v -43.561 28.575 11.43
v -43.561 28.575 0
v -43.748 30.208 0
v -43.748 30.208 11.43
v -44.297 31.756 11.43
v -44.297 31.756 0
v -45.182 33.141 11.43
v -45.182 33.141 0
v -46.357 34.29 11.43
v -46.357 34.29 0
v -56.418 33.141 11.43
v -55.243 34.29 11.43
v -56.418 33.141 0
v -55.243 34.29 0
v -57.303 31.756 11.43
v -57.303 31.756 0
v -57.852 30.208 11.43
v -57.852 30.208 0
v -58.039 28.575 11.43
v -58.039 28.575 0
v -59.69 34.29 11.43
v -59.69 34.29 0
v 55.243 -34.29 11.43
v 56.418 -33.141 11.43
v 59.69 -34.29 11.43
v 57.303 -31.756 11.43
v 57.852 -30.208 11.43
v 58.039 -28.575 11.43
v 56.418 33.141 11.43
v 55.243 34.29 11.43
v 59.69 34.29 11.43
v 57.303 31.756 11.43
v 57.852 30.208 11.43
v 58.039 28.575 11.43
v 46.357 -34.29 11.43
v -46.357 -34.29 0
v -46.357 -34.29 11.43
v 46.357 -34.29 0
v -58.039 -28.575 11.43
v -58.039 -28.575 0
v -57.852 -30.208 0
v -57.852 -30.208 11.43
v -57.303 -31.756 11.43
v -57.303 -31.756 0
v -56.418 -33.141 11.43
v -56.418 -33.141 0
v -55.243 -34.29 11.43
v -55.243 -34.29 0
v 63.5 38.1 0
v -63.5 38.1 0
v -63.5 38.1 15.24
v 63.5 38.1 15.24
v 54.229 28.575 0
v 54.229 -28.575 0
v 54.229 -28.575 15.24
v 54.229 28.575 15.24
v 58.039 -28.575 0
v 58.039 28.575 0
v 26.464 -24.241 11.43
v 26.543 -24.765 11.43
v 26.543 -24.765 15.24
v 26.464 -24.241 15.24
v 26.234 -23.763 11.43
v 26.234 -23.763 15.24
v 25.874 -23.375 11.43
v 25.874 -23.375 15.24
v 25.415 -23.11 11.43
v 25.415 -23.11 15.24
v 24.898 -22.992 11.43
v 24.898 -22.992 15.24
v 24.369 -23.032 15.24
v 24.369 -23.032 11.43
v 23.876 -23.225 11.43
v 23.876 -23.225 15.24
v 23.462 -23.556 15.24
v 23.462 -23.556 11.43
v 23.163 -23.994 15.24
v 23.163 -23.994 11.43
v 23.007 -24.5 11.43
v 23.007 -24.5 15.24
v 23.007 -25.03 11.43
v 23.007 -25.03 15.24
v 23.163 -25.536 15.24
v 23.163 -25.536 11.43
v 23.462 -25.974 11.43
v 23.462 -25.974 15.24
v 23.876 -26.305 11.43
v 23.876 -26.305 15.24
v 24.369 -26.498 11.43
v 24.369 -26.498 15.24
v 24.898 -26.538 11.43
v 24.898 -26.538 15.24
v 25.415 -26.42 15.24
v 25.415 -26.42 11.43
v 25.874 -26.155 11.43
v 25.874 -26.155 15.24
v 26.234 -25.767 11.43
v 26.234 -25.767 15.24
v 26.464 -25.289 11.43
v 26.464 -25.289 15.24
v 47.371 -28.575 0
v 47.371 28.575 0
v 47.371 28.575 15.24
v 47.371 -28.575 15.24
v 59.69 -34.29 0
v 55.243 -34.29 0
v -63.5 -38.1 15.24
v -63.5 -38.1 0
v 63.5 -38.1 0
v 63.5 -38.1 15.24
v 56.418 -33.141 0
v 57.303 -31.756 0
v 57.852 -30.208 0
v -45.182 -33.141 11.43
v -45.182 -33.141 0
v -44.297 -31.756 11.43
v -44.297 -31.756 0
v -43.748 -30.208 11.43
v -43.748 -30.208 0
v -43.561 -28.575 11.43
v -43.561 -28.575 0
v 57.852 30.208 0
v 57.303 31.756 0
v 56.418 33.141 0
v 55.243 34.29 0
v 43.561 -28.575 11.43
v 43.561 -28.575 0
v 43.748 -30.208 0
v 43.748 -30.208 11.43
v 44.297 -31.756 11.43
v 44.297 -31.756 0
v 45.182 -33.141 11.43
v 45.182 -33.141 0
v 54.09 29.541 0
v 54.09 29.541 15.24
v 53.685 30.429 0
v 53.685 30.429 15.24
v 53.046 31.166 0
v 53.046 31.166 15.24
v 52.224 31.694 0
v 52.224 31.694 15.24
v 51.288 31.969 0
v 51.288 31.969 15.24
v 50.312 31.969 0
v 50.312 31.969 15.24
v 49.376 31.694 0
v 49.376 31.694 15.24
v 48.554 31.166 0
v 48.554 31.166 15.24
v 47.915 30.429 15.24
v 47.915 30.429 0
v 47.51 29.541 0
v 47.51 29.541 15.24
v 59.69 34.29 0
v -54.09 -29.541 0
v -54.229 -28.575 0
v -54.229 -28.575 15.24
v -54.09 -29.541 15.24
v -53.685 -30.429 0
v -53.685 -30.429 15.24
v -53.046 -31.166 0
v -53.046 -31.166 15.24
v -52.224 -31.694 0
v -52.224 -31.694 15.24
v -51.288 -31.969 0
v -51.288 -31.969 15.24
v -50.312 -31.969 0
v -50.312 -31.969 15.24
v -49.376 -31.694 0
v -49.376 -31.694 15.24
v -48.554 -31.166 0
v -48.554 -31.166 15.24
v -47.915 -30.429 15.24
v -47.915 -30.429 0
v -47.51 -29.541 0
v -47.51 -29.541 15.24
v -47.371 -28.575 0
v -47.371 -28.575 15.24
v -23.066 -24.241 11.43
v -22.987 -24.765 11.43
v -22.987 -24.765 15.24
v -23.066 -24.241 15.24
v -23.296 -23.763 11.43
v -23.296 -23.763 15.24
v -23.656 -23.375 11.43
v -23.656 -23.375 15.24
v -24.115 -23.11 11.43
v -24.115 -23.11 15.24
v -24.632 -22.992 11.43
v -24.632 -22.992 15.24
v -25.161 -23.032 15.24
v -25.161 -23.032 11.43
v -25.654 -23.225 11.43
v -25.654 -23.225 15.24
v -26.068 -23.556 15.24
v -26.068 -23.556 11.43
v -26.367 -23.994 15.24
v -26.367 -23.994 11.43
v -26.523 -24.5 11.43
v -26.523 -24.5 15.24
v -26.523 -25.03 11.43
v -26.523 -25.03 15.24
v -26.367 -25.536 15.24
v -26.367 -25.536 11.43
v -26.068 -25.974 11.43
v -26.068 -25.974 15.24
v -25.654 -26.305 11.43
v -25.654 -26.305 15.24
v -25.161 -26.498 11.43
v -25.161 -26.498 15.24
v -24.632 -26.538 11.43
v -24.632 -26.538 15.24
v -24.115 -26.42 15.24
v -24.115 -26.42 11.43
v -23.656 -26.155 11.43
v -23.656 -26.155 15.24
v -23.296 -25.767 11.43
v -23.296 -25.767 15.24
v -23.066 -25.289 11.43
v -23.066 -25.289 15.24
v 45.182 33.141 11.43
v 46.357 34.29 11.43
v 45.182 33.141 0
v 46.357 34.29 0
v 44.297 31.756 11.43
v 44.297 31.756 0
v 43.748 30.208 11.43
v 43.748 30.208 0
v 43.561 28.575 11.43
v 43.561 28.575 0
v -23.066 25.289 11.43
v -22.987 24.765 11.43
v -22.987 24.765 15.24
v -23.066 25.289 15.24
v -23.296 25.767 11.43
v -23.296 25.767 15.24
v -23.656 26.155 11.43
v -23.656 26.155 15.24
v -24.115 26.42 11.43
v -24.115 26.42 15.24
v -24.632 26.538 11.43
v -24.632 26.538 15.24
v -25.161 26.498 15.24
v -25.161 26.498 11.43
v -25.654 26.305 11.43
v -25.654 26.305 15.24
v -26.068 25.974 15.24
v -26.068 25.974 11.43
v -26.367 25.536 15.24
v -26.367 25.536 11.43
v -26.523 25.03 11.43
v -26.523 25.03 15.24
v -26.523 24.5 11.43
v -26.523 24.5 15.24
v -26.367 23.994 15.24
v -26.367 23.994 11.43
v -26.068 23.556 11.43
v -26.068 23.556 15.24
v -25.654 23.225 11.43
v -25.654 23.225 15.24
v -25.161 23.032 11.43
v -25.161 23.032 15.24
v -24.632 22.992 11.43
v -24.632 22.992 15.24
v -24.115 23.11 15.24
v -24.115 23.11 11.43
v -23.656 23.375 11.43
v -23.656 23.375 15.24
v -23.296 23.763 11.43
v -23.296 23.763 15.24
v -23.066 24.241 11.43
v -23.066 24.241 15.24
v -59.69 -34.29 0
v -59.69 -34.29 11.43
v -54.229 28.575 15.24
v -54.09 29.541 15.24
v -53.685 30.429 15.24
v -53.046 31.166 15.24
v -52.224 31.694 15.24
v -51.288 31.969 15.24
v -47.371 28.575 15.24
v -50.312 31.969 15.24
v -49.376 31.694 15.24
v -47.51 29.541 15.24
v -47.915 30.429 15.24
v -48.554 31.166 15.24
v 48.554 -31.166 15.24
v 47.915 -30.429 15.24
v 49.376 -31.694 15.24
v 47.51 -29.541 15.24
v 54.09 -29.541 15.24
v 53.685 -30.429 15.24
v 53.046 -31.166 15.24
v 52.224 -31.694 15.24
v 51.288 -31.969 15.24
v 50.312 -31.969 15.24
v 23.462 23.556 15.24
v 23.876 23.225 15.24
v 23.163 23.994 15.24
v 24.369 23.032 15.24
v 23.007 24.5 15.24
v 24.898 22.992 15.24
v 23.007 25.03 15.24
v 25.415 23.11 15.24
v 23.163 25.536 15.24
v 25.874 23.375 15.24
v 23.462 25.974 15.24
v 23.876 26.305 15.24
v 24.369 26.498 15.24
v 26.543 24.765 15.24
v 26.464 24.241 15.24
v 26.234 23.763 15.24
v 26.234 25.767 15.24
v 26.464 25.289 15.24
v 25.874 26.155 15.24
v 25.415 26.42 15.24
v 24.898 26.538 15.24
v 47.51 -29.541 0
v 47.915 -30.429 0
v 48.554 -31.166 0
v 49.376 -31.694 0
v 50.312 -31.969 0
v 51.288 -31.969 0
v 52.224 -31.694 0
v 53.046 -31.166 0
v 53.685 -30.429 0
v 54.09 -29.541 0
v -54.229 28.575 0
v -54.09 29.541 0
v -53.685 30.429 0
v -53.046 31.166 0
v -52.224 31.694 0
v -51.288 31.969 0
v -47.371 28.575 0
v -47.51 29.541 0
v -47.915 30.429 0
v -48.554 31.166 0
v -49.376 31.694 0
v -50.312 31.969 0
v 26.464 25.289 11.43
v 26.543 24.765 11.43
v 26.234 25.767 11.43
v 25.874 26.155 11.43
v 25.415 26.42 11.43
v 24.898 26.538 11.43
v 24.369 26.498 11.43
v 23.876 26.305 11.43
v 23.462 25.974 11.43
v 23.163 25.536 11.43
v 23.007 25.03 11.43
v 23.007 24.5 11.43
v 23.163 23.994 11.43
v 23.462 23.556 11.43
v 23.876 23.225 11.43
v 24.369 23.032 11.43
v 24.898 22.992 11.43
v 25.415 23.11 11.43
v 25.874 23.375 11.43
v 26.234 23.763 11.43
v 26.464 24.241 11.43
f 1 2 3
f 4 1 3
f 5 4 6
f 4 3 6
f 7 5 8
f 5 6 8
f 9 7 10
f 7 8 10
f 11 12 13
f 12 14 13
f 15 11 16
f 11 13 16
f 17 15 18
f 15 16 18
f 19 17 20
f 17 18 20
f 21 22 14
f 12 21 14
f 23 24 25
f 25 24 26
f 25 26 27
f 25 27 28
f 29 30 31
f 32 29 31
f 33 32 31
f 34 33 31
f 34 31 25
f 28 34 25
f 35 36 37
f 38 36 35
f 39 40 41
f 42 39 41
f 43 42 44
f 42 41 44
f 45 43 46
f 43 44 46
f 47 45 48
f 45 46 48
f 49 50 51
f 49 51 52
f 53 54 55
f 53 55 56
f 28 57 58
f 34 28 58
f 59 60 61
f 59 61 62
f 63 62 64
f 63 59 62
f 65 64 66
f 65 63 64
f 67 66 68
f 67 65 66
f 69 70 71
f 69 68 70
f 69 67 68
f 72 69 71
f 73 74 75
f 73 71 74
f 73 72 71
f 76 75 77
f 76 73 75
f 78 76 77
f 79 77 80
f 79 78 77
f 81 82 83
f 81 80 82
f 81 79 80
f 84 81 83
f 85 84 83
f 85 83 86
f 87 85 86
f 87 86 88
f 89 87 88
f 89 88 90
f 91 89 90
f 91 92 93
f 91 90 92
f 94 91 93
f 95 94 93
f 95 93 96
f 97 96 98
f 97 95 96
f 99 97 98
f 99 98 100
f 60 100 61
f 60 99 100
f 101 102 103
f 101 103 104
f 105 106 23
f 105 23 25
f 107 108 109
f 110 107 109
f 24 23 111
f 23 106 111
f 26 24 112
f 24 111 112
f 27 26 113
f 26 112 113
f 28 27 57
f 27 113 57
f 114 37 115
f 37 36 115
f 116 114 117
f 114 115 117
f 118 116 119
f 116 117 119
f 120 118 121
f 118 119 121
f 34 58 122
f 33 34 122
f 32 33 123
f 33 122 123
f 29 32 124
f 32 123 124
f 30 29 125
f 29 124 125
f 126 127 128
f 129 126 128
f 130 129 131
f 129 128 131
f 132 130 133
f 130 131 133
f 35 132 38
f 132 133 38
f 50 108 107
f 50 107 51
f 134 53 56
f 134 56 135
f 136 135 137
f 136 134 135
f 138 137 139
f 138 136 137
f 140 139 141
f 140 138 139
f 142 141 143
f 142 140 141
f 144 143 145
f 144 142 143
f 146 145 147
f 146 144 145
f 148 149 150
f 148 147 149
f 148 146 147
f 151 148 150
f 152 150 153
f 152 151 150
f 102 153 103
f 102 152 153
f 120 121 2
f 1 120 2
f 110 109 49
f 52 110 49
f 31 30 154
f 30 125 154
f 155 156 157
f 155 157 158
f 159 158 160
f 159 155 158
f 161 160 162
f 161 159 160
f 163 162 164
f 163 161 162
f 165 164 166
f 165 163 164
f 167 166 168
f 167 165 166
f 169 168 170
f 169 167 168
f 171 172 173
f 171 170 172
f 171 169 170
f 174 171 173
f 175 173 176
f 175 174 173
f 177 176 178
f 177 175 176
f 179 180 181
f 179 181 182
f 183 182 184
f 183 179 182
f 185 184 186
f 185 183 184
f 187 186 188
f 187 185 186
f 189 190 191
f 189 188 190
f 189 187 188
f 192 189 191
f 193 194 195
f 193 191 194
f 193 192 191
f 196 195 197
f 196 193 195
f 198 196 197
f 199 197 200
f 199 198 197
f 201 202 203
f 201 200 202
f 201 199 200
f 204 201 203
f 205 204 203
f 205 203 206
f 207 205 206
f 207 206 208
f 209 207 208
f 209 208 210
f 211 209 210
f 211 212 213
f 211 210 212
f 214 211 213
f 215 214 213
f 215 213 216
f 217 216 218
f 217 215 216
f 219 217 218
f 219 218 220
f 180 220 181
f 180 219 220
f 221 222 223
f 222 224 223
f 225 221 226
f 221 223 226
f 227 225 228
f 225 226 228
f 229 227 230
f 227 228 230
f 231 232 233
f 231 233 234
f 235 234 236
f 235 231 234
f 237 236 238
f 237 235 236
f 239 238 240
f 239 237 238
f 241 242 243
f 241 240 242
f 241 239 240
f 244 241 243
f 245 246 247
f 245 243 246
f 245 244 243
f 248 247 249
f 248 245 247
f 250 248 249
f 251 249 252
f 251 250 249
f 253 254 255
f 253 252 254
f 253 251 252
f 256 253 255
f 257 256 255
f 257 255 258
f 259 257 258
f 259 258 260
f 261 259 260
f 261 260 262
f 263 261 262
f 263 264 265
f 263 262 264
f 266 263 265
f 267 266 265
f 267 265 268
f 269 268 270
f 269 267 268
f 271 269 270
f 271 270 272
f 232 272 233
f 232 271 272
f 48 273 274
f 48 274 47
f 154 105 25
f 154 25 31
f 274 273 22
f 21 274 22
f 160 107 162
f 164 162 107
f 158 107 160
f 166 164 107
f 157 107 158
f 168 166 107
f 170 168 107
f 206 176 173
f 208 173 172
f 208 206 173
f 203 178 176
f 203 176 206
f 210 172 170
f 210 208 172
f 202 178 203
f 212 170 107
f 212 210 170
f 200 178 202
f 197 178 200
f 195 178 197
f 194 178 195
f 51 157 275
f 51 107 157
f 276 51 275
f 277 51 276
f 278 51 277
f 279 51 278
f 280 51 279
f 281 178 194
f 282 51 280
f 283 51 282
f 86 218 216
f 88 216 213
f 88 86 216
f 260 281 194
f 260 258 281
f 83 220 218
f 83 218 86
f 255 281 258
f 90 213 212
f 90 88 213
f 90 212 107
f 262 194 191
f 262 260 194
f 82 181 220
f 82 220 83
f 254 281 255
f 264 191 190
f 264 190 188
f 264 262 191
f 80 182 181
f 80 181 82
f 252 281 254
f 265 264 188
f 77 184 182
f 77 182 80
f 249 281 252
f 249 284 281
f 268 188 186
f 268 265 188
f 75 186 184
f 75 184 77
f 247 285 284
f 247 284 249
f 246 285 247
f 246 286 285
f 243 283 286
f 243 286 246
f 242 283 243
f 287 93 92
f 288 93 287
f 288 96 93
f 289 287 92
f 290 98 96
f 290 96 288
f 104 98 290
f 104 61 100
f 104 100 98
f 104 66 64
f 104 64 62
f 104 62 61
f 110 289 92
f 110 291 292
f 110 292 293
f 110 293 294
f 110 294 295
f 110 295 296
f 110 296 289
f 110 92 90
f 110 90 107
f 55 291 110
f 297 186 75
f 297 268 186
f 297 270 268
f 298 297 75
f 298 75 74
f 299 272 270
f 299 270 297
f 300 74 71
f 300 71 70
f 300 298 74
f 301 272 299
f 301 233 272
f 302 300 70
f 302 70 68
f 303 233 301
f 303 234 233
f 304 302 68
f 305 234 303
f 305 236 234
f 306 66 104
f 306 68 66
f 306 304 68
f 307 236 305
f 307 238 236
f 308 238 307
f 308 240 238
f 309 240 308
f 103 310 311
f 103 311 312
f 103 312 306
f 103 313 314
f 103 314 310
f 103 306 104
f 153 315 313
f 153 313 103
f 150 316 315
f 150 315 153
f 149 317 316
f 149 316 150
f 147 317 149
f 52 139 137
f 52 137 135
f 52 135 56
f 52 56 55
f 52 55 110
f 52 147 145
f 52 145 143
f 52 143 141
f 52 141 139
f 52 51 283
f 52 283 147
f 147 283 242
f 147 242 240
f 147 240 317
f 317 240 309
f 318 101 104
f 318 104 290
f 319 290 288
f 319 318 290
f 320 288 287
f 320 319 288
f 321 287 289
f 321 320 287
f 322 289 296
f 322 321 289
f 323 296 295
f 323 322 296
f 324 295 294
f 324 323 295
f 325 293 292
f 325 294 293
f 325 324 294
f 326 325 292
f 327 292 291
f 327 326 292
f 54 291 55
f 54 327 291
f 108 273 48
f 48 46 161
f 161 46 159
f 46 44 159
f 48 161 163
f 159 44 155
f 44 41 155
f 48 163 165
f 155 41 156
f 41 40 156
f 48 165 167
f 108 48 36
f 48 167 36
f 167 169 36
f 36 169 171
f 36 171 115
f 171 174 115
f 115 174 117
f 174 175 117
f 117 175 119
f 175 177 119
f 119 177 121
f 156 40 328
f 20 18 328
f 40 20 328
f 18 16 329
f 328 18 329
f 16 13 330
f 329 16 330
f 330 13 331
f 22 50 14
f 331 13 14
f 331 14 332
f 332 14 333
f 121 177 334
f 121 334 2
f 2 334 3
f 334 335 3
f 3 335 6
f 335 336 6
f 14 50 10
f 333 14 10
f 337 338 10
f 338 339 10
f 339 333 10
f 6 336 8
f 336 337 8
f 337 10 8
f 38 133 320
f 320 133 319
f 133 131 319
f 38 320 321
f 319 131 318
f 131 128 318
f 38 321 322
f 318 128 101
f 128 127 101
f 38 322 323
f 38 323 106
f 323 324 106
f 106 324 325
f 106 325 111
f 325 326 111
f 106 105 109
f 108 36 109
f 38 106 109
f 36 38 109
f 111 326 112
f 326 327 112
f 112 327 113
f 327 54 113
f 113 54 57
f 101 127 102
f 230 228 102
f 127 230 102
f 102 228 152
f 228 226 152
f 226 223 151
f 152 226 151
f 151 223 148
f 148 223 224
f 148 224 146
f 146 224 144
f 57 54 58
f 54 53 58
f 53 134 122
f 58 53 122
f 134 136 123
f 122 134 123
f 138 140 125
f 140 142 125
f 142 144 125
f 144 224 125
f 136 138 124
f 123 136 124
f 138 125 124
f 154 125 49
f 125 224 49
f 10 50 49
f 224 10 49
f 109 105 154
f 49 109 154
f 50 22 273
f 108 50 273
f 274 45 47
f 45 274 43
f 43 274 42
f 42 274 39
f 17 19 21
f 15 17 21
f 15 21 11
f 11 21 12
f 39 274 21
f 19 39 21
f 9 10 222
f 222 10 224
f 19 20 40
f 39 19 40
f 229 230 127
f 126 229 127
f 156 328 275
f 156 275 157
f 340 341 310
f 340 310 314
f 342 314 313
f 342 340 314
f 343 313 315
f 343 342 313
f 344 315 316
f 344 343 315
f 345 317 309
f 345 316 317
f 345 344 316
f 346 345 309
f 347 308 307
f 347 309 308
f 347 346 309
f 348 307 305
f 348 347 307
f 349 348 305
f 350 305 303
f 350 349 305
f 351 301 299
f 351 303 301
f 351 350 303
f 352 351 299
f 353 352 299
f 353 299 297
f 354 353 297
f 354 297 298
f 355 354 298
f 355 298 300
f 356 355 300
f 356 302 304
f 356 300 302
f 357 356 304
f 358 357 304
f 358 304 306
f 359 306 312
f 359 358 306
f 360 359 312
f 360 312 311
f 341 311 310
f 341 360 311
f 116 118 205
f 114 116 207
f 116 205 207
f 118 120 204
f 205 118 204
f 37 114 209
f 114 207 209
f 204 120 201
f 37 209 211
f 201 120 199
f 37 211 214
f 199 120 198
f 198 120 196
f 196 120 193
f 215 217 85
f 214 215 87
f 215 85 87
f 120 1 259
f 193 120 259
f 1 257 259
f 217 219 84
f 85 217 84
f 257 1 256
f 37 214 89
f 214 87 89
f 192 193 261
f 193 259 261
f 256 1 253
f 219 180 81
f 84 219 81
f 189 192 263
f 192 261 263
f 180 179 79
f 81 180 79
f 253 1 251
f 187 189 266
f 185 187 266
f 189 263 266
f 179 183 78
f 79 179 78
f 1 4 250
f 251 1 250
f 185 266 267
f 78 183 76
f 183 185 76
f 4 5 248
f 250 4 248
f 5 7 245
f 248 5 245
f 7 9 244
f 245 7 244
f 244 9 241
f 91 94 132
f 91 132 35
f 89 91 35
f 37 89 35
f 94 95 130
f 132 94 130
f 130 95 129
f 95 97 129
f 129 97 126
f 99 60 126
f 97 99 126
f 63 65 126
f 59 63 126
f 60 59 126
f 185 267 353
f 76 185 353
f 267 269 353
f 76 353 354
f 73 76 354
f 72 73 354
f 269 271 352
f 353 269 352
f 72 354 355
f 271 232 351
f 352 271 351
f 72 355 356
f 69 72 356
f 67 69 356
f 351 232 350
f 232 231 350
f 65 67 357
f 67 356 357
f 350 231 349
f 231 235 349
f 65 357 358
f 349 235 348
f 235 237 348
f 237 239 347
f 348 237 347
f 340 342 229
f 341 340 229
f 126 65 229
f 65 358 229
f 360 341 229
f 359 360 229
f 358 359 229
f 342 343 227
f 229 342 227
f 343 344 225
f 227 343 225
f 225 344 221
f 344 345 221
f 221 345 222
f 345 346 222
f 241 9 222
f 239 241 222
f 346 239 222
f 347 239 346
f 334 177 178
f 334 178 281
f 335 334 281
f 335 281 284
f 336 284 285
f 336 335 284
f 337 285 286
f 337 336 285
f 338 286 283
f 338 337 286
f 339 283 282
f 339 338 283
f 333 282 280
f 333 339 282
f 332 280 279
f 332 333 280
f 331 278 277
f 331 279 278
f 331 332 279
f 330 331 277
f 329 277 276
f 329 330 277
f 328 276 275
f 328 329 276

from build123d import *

# Parameters (mm, degrees)
F0_W     = 127
F0_H     = 76.2
F1_DEPTH = 15.24
F3_DEPTH = 15.241
F4_T     = -3.81
F5_R     = 1.778
F6_DEPTH = 15.241


with BuildPart() as f1:
    # F0 (on Top) → F1 (new body)
    with BuildSketch(Plane.XY):
        Rectangle(F0_W, F0_H)
    extrude(amount=F1_DEPTH)

    # F2 (on Top) → F3 (cut, through all)
    with BuildSketch(Plane.XY):
        with BuildLine():
            ThreePointArc((-47.371, 28.575), (-50.8, 32.004), (-54.229, 28.575))
            Line((-54.229, 28.575), (-54.229, -28.575))
            ThreePointArc((-54.229, -28.575), (-50.8, -32.004), (-47.371, -28.575))
            Line((-47.371, -28.575), (-47.371, 28.575))
        make_face()
        with BuildLine():
            ThreePointArc((54.229, 28.575), (50.8, 32.004), (47.371, 28.575))
            Line((47.371, 28.575), (47.371, -28.575))
            ThreePointArc((47.371, -28.575), (50.8, -32.004), (54.229, -28.575))
            Line((54.229, -28.575), (54.229, 28.575))
        make_face()
    extrude(amount=F3_DEPTH, mode=Mode.SUBTRACT)

    # F4
    f4_openings = [f1.faces().sort_by_distance(p)[0] for p in [
        (0, 0, 0),
    ]]
    offset(amount=F4_T, openings=f4_openings)

    # F5 (on Top) → F6 (cut, through all)
    with BuildSketch(Plane.XY):
        with Locations((-24.765, 24.765)):
            Circle(F5_R)
        with Locations((24.765, 24.765)):
            Circle(F5_R)
        with Locations((-24.765, -24.765)):
            Circle(F5_R)
        with Locations((24.765, -24.765)):
            Circle(F5_R)
    extrude(amount=F6_DEPTH, mode=Mode.SUBTRACT)


solid = f1.part
